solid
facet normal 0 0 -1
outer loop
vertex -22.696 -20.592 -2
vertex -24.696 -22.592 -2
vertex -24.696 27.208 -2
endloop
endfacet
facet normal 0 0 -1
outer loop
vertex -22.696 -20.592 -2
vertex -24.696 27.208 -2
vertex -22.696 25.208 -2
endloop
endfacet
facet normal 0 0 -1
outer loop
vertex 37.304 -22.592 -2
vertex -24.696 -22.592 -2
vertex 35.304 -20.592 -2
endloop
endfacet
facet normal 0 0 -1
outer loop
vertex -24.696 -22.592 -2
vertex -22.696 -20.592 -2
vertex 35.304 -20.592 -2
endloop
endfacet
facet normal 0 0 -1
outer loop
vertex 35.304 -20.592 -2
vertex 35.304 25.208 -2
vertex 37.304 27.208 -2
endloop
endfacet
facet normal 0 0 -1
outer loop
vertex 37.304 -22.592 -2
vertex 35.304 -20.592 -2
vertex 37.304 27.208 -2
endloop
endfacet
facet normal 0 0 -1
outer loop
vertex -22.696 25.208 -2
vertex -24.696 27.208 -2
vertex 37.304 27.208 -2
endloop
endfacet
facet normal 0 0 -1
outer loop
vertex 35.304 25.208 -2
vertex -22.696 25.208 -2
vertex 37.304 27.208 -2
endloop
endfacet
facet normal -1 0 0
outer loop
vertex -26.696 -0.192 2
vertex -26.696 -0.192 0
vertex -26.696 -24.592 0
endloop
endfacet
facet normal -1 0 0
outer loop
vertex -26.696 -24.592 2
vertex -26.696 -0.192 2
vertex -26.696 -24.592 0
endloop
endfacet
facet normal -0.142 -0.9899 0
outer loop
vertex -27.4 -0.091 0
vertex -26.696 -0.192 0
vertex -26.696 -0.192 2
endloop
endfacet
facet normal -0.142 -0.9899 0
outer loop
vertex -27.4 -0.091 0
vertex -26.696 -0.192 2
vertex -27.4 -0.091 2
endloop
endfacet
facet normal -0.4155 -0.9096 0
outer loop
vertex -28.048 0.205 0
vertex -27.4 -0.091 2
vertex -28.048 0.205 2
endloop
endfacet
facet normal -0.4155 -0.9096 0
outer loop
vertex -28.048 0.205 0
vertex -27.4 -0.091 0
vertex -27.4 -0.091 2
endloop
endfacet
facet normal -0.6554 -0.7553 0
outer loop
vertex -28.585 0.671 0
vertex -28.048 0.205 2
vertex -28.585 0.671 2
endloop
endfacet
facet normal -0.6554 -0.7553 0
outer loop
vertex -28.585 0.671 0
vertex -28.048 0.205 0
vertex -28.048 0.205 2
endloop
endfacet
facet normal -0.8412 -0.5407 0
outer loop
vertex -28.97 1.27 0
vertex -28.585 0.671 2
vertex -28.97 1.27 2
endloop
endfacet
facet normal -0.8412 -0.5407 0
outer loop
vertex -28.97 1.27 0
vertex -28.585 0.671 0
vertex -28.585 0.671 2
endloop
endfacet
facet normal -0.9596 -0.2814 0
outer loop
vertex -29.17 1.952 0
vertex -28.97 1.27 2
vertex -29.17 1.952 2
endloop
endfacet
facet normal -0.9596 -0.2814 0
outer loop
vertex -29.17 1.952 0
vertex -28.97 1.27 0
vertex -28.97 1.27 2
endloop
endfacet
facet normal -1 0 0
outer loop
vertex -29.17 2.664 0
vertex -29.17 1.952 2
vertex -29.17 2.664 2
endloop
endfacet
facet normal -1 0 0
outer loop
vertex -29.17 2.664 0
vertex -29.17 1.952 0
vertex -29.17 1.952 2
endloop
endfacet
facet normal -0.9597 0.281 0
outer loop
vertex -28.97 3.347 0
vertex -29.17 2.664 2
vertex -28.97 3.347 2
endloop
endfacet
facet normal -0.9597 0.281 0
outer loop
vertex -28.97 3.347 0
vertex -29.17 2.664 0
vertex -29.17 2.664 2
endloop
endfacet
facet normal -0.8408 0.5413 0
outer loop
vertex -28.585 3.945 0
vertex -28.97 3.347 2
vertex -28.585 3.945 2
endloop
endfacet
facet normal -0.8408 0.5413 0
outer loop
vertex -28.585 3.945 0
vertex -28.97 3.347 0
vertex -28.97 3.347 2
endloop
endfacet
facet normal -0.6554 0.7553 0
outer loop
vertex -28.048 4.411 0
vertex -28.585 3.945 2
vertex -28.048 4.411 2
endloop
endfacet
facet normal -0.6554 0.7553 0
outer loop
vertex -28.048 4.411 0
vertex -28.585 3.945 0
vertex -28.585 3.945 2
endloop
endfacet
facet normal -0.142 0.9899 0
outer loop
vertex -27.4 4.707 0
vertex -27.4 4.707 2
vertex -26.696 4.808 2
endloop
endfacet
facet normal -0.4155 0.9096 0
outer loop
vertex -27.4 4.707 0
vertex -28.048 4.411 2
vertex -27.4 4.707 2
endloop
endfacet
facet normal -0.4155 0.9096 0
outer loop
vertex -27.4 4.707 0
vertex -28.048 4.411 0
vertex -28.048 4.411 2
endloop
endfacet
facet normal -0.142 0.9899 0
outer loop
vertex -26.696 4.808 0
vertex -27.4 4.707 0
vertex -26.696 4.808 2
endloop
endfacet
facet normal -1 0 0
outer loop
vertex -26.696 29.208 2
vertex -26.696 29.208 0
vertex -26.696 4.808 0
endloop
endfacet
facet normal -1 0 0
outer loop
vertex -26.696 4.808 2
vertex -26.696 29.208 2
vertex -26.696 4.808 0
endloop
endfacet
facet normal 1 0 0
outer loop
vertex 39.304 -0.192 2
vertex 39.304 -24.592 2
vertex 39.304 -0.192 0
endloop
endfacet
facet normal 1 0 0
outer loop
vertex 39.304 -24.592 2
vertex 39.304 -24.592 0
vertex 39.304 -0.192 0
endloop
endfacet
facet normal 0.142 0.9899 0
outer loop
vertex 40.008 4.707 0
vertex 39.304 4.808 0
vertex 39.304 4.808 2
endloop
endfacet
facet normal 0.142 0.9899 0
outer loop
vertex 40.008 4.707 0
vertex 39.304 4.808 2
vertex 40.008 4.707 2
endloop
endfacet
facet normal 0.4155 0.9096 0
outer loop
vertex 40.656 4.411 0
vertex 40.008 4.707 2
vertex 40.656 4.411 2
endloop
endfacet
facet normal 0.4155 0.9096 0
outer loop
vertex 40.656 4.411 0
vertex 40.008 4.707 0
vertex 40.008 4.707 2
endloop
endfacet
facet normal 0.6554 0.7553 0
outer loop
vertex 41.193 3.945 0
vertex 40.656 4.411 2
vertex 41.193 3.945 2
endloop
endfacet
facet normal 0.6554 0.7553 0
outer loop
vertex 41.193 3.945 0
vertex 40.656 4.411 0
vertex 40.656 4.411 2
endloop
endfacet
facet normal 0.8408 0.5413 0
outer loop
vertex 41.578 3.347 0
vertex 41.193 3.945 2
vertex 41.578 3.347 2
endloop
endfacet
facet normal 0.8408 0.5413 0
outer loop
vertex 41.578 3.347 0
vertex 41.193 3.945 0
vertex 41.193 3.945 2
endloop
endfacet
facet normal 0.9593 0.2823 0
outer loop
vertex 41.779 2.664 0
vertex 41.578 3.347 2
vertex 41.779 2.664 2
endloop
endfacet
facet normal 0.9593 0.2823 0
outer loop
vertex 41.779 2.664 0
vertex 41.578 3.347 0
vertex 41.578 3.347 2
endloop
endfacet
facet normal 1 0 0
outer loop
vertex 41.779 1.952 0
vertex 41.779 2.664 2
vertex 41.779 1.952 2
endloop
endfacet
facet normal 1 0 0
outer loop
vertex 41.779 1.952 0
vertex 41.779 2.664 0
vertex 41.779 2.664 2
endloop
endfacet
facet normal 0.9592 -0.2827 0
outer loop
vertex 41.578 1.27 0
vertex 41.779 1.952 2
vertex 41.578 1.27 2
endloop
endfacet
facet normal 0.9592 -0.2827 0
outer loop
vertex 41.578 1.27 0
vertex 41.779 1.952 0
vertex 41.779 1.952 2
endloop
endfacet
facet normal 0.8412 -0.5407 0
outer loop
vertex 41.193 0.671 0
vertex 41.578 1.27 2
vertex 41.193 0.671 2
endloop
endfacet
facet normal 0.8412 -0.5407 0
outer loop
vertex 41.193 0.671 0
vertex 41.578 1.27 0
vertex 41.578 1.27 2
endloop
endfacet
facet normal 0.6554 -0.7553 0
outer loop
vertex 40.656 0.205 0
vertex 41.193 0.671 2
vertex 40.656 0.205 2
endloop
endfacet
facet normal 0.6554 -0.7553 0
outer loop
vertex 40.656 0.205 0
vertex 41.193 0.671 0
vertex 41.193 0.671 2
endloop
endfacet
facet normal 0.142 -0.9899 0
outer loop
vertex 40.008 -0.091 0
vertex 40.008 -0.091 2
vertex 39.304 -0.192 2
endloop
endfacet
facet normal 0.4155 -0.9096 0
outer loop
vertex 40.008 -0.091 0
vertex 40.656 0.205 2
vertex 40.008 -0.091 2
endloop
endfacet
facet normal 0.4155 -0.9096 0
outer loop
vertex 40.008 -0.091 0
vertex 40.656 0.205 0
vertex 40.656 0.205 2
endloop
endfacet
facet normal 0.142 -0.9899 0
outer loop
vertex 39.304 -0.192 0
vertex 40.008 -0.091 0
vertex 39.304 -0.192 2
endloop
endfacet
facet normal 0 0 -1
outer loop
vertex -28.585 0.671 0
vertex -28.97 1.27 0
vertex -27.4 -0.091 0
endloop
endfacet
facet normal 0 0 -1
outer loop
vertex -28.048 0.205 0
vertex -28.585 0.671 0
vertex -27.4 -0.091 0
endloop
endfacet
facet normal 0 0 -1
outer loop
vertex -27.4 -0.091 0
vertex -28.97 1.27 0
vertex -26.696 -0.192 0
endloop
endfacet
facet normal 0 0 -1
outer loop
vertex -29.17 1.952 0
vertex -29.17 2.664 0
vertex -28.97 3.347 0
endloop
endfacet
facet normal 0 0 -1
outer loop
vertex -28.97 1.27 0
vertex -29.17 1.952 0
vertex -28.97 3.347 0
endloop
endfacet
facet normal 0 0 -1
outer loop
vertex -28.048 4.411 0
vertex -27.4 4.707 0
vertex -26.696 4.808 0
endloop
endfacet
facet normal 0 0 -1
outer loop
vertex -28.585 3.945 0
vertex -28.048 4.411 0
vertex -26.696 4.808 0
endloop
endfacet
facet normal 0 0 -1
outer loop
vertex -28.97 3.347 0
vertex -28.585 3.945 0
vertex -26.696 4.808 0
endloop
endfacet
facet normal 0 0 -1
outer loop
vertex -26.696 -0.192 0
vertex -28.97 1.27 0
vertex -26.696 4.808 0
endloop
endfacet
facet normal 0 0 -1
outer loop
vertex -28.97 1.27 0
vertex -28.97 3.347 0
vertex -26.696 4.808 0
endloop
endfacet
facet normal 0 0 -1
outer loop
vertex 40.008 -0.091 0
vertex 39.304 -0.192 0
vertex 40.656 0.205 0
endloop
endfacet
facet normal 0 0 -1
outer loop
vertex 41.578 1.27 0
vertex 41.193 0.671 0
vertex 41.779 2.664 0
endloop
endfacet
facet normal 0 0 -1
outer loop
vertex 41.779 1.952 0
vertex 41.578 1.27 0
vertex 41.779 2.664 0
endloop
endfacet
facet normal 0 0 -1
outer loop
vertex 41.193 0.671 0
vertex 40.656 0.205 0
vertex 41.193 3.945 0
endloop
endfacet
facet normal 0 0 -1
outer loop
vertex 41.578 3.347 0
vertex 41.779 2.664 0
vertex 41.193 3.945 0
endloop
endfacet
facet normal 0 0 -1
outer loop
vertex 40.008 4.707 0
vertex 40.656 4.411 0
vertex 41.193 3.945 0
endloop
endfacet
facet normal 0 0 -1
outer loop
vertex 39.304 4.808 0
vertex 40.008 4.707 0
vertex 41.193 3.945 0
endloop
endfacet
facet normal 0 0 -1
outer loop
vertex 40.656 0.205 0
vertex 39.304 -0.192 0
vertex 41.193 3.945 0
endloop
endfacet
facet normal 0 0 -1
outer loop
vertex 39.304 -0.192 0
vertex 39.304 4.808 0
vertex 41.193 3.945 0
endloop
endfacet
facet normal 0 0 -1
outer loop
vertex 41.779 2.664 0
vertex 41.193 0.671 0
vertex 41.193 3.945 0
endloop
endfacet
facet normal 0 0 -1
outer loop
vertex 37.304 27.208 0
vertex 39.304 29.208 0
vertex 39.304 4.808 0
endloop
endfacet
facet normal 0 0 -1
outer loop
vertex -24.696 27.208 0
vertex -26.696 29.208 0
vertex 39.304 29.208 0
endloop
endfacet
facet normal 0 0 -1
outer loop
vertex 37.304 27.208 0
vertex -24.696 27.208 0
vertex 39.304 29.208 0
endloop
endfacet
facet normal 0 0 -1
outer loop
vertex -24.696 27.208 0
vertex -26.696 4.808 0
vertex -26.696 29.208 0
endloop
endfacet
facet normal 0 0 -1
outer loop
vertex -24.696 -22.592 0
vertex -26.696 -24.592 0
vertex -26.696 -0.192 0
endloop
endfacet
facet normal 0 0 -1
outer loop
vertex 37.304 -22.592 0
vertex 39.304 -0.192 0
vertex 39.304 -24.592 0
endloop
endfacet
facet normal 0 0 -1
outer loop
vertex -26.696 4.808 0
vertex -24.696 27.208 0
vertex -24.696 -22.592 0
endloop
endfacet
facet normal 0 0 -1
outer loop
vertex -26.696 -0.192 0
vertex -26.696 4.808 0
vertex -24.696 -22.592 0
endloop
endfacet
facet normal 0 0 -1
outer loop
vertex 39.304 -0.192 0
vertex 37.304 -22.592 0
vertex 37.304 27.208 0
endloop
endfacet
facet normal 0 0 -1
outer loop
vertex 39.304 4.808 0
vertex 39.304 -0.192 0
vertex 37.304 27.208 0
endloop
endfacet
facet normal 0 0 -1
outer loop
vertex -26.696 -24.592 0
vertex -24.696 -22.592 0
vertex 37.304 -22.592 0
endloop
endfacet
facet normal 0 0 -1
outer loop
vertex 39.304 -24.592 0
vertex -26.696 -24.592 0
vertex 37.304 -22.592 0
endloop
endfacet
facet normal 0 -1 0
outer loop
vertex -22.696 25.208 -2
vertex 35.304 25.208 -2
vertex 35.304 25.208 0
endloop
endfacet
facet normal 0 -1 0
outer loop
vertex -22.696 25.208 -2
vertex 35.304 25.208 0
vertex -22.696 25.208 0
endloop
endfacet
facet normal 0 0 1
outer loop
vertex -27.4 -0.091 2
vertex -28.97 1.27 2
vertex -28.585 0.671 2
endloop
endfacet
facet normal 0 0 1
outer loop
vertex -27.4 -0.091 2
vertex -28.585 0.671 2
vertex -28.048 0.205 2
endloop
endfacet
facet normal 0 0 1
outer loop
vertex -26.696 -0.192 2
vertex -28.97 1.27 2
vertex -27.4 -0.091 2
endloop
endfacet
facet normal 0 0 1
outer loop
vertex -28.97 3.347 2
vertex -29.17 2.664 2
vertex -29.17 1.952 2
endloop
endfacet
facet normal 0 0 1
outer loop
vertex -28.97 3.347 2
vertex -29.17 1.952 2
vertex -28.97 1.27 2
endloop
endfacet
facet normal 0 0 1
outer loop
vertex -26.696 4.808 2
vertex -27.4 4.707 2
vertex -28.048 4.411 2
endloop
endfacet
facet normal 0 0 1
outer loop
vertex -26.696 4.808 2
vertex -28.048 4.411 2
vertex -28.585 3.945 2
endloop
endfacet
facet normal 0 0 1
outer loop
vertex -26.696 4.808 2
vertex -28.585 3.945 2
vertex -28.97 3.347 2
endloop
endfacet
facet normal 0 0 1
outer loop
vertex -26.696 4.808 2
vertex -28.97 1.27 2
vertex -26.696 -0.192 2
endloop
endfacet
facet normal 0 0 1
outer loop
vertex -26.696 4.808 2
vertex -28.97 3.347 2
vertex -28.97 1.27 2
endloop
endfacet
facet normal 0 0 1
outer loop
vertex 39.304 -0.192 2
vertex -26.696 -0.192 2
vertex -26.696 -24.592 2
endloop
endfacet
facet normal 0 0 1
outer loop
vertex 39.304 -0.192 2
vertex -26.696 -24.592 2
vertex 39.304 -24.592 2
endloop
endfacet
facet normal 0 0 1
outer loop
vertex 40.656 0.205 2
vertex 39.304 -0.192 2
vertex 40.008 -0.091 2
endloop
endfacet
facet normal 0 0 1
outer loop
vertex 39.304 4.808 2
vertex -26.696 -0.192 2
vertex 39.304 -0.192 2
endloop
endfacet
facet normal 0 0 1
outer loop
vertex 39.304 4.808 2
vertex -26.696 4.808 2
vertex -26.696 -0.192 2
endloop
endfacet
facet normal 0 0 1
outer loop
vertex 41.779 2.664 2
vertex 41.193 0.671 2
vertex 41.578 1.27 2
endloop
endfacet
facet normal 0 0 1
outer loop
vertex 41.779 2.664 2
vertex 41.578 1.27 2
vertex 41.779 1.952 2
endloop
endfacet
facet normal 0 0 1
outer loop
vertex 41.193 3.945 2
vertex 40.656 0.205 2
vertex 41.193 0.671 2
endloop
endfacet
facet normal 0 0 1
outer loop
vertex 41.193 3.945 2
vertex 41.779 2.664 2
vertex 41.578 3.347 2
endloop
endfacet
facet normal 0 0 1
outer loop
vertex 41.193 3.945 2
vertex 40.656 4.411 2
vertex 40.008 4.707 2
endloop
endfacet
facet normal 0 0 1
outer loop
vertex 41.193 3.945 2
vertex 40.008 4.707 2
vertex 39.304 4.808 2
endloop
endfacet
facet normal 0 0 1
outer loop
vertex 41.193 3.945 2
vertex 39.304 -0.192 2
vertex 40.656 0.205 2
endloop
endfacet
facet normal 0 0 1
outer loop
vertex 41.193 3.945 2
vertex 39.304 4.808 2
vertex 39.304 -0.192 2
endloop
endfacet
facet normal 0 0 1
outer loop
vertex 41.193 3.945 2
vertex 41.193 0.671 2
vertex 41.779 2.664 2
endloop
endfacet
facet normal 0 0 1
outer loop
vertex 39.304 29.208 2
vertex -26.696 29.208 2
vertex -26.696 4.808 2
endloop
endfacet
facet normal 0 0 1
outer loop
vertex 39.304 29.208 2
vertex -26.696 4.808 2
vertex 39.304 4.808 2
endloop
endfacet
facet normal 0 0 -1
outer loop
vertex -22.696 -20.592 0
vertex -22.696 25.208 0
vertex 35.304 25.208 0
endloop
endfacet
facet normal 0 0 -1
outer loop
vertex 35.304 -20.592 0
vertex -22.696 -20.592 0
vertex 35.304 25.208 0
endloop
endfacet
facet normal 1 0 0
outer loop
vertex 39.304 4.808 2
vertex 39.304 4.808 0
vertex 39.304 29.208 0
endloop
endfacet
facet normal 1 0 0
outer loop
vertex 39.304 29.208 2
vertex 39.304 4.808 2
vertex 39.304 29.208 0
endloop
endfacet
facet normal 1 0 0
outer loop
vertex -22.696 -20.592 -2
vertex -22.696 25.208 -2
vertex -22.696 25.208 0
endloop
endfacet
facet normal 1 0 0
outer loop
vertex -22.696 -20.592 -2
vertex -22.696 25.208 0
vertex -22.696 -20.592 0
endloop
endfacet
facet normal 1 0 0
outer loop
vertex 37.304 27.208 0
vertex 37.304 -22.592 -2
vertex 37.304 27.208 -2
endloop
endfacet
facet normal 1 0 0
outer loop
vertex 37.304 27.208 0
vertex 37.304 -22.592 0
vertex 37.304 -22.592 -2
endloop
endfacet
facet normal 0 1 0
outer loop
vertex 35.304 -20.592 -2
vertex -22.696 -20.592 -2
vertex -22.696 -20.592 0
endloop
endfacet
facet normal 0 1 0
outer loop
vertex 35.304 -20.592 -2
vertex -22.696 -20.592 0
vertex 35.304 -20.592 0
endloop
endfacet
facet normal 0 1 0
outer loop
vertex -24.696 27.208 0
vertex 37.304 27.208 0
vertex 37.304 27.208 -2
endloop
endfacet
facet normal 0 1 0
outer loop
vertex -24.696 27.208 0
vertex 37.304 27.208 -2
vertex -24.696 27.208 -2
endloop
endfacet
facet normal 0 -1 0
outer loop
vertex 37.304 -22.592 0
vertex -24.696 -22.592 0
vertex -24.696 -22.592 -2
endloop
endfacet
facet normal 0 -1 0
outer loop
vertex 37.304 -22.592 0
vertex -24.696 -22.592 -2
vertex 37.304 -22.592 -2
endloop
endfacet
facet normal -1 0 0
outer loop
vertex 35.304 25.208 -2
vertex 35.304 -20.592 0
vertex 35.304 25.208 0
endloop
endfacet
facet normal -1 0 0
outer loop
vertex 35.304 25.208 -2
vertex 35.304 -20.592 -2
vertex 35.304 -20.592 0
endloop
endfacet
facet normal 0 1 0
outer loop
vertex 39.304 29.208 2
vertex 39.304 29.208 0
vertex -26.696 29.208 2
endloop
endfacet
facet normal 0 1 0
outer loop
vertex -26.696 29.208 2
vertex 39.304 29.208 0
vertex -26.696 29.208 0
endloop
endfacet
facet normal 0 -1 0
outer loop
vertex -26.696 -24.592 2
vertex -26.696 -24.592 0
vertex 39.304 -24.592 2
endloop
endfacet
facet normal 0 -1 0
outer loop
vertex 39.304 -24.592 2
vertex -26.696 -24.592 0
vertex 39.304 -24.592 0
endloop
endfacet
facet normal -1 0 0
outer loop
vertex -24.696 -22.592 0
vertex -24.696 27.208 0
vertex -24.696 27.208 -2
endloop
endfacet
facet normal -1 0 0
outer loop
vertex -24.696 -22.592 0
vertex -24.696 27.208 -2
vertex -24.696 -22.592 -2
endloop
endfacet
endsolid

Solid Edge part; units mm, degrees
sketch "Sketch1" plane through (0, 0, 0) normal (0, 0, 1) x (1, 0, 0)
  line L0 (-26.6959, -24.5918) -> (39.3041, -24.5918)
  line L1 (39.3041, -24.5918) -> (39.3041, 29.2082)
  line L2 (39.3041, 29.2082) -> (-26.6959, 29.2082)
  line L3 (-26.6959, 29.2082) -> (-26.6959, -24.5918)
extrude "Protrusion1" add sketch "Sketch1" along normal blind 2
sketch "Sketch2" plane through (6.3041, 2.3082, 0) normal (0, 0, -1) x (1, 0, 0)
  line L0 (-31, 24.9) -> (31, 24.9)
  line L1 (31, 24.9) -> (31, -24.9)
  line L2 (31, -24.9) -> (-31, -24.9)
  line L3 (-31, -24.9) -> (-31, 24.9)
extrude "ExtrudedProtrusion_2" add sketch "Sketch2" along normal blind 2
sketch "Sketch3" plane through (6.3041, 2.3082, -2) normal (0, 0, -1) x (1, 0, 0)
  line L0 (-29, 22.9) -> (29, 22.9)
  line L1 (29, 22.9) -> (29, -22.9)
  line L2 (29, -22.9) -> (-29, -22.9)
  line L3 (-29, -22.9) -> (-29, 22.9)
extrude "ExtrudedCutout_1" cut sketch "Sketch3" against normal blind 2
sketch "Sketch4" plane through (0, 0, 0) normal (0, 0, 1) x (1, 0, 0)
  line L0 (-26.6959, -0.1918) -> (-26.6959, 4.8082)
  arc A0 (-26.6959, 4.8082) -> (-26.6959, -0.1918) centre (-26.6959, 2.3082) ccw
  line L1 (39.3041, 4.8082) -> (39.3041, -0.1918)
  arc A1 (39.3041, -0.1918) -> (39.3041, 4.8082) centre (39.3041, 2.3082) ccw
extrude "ExtrudedProtrusion_3" add sketch "Sketch4" along normal blind 2
